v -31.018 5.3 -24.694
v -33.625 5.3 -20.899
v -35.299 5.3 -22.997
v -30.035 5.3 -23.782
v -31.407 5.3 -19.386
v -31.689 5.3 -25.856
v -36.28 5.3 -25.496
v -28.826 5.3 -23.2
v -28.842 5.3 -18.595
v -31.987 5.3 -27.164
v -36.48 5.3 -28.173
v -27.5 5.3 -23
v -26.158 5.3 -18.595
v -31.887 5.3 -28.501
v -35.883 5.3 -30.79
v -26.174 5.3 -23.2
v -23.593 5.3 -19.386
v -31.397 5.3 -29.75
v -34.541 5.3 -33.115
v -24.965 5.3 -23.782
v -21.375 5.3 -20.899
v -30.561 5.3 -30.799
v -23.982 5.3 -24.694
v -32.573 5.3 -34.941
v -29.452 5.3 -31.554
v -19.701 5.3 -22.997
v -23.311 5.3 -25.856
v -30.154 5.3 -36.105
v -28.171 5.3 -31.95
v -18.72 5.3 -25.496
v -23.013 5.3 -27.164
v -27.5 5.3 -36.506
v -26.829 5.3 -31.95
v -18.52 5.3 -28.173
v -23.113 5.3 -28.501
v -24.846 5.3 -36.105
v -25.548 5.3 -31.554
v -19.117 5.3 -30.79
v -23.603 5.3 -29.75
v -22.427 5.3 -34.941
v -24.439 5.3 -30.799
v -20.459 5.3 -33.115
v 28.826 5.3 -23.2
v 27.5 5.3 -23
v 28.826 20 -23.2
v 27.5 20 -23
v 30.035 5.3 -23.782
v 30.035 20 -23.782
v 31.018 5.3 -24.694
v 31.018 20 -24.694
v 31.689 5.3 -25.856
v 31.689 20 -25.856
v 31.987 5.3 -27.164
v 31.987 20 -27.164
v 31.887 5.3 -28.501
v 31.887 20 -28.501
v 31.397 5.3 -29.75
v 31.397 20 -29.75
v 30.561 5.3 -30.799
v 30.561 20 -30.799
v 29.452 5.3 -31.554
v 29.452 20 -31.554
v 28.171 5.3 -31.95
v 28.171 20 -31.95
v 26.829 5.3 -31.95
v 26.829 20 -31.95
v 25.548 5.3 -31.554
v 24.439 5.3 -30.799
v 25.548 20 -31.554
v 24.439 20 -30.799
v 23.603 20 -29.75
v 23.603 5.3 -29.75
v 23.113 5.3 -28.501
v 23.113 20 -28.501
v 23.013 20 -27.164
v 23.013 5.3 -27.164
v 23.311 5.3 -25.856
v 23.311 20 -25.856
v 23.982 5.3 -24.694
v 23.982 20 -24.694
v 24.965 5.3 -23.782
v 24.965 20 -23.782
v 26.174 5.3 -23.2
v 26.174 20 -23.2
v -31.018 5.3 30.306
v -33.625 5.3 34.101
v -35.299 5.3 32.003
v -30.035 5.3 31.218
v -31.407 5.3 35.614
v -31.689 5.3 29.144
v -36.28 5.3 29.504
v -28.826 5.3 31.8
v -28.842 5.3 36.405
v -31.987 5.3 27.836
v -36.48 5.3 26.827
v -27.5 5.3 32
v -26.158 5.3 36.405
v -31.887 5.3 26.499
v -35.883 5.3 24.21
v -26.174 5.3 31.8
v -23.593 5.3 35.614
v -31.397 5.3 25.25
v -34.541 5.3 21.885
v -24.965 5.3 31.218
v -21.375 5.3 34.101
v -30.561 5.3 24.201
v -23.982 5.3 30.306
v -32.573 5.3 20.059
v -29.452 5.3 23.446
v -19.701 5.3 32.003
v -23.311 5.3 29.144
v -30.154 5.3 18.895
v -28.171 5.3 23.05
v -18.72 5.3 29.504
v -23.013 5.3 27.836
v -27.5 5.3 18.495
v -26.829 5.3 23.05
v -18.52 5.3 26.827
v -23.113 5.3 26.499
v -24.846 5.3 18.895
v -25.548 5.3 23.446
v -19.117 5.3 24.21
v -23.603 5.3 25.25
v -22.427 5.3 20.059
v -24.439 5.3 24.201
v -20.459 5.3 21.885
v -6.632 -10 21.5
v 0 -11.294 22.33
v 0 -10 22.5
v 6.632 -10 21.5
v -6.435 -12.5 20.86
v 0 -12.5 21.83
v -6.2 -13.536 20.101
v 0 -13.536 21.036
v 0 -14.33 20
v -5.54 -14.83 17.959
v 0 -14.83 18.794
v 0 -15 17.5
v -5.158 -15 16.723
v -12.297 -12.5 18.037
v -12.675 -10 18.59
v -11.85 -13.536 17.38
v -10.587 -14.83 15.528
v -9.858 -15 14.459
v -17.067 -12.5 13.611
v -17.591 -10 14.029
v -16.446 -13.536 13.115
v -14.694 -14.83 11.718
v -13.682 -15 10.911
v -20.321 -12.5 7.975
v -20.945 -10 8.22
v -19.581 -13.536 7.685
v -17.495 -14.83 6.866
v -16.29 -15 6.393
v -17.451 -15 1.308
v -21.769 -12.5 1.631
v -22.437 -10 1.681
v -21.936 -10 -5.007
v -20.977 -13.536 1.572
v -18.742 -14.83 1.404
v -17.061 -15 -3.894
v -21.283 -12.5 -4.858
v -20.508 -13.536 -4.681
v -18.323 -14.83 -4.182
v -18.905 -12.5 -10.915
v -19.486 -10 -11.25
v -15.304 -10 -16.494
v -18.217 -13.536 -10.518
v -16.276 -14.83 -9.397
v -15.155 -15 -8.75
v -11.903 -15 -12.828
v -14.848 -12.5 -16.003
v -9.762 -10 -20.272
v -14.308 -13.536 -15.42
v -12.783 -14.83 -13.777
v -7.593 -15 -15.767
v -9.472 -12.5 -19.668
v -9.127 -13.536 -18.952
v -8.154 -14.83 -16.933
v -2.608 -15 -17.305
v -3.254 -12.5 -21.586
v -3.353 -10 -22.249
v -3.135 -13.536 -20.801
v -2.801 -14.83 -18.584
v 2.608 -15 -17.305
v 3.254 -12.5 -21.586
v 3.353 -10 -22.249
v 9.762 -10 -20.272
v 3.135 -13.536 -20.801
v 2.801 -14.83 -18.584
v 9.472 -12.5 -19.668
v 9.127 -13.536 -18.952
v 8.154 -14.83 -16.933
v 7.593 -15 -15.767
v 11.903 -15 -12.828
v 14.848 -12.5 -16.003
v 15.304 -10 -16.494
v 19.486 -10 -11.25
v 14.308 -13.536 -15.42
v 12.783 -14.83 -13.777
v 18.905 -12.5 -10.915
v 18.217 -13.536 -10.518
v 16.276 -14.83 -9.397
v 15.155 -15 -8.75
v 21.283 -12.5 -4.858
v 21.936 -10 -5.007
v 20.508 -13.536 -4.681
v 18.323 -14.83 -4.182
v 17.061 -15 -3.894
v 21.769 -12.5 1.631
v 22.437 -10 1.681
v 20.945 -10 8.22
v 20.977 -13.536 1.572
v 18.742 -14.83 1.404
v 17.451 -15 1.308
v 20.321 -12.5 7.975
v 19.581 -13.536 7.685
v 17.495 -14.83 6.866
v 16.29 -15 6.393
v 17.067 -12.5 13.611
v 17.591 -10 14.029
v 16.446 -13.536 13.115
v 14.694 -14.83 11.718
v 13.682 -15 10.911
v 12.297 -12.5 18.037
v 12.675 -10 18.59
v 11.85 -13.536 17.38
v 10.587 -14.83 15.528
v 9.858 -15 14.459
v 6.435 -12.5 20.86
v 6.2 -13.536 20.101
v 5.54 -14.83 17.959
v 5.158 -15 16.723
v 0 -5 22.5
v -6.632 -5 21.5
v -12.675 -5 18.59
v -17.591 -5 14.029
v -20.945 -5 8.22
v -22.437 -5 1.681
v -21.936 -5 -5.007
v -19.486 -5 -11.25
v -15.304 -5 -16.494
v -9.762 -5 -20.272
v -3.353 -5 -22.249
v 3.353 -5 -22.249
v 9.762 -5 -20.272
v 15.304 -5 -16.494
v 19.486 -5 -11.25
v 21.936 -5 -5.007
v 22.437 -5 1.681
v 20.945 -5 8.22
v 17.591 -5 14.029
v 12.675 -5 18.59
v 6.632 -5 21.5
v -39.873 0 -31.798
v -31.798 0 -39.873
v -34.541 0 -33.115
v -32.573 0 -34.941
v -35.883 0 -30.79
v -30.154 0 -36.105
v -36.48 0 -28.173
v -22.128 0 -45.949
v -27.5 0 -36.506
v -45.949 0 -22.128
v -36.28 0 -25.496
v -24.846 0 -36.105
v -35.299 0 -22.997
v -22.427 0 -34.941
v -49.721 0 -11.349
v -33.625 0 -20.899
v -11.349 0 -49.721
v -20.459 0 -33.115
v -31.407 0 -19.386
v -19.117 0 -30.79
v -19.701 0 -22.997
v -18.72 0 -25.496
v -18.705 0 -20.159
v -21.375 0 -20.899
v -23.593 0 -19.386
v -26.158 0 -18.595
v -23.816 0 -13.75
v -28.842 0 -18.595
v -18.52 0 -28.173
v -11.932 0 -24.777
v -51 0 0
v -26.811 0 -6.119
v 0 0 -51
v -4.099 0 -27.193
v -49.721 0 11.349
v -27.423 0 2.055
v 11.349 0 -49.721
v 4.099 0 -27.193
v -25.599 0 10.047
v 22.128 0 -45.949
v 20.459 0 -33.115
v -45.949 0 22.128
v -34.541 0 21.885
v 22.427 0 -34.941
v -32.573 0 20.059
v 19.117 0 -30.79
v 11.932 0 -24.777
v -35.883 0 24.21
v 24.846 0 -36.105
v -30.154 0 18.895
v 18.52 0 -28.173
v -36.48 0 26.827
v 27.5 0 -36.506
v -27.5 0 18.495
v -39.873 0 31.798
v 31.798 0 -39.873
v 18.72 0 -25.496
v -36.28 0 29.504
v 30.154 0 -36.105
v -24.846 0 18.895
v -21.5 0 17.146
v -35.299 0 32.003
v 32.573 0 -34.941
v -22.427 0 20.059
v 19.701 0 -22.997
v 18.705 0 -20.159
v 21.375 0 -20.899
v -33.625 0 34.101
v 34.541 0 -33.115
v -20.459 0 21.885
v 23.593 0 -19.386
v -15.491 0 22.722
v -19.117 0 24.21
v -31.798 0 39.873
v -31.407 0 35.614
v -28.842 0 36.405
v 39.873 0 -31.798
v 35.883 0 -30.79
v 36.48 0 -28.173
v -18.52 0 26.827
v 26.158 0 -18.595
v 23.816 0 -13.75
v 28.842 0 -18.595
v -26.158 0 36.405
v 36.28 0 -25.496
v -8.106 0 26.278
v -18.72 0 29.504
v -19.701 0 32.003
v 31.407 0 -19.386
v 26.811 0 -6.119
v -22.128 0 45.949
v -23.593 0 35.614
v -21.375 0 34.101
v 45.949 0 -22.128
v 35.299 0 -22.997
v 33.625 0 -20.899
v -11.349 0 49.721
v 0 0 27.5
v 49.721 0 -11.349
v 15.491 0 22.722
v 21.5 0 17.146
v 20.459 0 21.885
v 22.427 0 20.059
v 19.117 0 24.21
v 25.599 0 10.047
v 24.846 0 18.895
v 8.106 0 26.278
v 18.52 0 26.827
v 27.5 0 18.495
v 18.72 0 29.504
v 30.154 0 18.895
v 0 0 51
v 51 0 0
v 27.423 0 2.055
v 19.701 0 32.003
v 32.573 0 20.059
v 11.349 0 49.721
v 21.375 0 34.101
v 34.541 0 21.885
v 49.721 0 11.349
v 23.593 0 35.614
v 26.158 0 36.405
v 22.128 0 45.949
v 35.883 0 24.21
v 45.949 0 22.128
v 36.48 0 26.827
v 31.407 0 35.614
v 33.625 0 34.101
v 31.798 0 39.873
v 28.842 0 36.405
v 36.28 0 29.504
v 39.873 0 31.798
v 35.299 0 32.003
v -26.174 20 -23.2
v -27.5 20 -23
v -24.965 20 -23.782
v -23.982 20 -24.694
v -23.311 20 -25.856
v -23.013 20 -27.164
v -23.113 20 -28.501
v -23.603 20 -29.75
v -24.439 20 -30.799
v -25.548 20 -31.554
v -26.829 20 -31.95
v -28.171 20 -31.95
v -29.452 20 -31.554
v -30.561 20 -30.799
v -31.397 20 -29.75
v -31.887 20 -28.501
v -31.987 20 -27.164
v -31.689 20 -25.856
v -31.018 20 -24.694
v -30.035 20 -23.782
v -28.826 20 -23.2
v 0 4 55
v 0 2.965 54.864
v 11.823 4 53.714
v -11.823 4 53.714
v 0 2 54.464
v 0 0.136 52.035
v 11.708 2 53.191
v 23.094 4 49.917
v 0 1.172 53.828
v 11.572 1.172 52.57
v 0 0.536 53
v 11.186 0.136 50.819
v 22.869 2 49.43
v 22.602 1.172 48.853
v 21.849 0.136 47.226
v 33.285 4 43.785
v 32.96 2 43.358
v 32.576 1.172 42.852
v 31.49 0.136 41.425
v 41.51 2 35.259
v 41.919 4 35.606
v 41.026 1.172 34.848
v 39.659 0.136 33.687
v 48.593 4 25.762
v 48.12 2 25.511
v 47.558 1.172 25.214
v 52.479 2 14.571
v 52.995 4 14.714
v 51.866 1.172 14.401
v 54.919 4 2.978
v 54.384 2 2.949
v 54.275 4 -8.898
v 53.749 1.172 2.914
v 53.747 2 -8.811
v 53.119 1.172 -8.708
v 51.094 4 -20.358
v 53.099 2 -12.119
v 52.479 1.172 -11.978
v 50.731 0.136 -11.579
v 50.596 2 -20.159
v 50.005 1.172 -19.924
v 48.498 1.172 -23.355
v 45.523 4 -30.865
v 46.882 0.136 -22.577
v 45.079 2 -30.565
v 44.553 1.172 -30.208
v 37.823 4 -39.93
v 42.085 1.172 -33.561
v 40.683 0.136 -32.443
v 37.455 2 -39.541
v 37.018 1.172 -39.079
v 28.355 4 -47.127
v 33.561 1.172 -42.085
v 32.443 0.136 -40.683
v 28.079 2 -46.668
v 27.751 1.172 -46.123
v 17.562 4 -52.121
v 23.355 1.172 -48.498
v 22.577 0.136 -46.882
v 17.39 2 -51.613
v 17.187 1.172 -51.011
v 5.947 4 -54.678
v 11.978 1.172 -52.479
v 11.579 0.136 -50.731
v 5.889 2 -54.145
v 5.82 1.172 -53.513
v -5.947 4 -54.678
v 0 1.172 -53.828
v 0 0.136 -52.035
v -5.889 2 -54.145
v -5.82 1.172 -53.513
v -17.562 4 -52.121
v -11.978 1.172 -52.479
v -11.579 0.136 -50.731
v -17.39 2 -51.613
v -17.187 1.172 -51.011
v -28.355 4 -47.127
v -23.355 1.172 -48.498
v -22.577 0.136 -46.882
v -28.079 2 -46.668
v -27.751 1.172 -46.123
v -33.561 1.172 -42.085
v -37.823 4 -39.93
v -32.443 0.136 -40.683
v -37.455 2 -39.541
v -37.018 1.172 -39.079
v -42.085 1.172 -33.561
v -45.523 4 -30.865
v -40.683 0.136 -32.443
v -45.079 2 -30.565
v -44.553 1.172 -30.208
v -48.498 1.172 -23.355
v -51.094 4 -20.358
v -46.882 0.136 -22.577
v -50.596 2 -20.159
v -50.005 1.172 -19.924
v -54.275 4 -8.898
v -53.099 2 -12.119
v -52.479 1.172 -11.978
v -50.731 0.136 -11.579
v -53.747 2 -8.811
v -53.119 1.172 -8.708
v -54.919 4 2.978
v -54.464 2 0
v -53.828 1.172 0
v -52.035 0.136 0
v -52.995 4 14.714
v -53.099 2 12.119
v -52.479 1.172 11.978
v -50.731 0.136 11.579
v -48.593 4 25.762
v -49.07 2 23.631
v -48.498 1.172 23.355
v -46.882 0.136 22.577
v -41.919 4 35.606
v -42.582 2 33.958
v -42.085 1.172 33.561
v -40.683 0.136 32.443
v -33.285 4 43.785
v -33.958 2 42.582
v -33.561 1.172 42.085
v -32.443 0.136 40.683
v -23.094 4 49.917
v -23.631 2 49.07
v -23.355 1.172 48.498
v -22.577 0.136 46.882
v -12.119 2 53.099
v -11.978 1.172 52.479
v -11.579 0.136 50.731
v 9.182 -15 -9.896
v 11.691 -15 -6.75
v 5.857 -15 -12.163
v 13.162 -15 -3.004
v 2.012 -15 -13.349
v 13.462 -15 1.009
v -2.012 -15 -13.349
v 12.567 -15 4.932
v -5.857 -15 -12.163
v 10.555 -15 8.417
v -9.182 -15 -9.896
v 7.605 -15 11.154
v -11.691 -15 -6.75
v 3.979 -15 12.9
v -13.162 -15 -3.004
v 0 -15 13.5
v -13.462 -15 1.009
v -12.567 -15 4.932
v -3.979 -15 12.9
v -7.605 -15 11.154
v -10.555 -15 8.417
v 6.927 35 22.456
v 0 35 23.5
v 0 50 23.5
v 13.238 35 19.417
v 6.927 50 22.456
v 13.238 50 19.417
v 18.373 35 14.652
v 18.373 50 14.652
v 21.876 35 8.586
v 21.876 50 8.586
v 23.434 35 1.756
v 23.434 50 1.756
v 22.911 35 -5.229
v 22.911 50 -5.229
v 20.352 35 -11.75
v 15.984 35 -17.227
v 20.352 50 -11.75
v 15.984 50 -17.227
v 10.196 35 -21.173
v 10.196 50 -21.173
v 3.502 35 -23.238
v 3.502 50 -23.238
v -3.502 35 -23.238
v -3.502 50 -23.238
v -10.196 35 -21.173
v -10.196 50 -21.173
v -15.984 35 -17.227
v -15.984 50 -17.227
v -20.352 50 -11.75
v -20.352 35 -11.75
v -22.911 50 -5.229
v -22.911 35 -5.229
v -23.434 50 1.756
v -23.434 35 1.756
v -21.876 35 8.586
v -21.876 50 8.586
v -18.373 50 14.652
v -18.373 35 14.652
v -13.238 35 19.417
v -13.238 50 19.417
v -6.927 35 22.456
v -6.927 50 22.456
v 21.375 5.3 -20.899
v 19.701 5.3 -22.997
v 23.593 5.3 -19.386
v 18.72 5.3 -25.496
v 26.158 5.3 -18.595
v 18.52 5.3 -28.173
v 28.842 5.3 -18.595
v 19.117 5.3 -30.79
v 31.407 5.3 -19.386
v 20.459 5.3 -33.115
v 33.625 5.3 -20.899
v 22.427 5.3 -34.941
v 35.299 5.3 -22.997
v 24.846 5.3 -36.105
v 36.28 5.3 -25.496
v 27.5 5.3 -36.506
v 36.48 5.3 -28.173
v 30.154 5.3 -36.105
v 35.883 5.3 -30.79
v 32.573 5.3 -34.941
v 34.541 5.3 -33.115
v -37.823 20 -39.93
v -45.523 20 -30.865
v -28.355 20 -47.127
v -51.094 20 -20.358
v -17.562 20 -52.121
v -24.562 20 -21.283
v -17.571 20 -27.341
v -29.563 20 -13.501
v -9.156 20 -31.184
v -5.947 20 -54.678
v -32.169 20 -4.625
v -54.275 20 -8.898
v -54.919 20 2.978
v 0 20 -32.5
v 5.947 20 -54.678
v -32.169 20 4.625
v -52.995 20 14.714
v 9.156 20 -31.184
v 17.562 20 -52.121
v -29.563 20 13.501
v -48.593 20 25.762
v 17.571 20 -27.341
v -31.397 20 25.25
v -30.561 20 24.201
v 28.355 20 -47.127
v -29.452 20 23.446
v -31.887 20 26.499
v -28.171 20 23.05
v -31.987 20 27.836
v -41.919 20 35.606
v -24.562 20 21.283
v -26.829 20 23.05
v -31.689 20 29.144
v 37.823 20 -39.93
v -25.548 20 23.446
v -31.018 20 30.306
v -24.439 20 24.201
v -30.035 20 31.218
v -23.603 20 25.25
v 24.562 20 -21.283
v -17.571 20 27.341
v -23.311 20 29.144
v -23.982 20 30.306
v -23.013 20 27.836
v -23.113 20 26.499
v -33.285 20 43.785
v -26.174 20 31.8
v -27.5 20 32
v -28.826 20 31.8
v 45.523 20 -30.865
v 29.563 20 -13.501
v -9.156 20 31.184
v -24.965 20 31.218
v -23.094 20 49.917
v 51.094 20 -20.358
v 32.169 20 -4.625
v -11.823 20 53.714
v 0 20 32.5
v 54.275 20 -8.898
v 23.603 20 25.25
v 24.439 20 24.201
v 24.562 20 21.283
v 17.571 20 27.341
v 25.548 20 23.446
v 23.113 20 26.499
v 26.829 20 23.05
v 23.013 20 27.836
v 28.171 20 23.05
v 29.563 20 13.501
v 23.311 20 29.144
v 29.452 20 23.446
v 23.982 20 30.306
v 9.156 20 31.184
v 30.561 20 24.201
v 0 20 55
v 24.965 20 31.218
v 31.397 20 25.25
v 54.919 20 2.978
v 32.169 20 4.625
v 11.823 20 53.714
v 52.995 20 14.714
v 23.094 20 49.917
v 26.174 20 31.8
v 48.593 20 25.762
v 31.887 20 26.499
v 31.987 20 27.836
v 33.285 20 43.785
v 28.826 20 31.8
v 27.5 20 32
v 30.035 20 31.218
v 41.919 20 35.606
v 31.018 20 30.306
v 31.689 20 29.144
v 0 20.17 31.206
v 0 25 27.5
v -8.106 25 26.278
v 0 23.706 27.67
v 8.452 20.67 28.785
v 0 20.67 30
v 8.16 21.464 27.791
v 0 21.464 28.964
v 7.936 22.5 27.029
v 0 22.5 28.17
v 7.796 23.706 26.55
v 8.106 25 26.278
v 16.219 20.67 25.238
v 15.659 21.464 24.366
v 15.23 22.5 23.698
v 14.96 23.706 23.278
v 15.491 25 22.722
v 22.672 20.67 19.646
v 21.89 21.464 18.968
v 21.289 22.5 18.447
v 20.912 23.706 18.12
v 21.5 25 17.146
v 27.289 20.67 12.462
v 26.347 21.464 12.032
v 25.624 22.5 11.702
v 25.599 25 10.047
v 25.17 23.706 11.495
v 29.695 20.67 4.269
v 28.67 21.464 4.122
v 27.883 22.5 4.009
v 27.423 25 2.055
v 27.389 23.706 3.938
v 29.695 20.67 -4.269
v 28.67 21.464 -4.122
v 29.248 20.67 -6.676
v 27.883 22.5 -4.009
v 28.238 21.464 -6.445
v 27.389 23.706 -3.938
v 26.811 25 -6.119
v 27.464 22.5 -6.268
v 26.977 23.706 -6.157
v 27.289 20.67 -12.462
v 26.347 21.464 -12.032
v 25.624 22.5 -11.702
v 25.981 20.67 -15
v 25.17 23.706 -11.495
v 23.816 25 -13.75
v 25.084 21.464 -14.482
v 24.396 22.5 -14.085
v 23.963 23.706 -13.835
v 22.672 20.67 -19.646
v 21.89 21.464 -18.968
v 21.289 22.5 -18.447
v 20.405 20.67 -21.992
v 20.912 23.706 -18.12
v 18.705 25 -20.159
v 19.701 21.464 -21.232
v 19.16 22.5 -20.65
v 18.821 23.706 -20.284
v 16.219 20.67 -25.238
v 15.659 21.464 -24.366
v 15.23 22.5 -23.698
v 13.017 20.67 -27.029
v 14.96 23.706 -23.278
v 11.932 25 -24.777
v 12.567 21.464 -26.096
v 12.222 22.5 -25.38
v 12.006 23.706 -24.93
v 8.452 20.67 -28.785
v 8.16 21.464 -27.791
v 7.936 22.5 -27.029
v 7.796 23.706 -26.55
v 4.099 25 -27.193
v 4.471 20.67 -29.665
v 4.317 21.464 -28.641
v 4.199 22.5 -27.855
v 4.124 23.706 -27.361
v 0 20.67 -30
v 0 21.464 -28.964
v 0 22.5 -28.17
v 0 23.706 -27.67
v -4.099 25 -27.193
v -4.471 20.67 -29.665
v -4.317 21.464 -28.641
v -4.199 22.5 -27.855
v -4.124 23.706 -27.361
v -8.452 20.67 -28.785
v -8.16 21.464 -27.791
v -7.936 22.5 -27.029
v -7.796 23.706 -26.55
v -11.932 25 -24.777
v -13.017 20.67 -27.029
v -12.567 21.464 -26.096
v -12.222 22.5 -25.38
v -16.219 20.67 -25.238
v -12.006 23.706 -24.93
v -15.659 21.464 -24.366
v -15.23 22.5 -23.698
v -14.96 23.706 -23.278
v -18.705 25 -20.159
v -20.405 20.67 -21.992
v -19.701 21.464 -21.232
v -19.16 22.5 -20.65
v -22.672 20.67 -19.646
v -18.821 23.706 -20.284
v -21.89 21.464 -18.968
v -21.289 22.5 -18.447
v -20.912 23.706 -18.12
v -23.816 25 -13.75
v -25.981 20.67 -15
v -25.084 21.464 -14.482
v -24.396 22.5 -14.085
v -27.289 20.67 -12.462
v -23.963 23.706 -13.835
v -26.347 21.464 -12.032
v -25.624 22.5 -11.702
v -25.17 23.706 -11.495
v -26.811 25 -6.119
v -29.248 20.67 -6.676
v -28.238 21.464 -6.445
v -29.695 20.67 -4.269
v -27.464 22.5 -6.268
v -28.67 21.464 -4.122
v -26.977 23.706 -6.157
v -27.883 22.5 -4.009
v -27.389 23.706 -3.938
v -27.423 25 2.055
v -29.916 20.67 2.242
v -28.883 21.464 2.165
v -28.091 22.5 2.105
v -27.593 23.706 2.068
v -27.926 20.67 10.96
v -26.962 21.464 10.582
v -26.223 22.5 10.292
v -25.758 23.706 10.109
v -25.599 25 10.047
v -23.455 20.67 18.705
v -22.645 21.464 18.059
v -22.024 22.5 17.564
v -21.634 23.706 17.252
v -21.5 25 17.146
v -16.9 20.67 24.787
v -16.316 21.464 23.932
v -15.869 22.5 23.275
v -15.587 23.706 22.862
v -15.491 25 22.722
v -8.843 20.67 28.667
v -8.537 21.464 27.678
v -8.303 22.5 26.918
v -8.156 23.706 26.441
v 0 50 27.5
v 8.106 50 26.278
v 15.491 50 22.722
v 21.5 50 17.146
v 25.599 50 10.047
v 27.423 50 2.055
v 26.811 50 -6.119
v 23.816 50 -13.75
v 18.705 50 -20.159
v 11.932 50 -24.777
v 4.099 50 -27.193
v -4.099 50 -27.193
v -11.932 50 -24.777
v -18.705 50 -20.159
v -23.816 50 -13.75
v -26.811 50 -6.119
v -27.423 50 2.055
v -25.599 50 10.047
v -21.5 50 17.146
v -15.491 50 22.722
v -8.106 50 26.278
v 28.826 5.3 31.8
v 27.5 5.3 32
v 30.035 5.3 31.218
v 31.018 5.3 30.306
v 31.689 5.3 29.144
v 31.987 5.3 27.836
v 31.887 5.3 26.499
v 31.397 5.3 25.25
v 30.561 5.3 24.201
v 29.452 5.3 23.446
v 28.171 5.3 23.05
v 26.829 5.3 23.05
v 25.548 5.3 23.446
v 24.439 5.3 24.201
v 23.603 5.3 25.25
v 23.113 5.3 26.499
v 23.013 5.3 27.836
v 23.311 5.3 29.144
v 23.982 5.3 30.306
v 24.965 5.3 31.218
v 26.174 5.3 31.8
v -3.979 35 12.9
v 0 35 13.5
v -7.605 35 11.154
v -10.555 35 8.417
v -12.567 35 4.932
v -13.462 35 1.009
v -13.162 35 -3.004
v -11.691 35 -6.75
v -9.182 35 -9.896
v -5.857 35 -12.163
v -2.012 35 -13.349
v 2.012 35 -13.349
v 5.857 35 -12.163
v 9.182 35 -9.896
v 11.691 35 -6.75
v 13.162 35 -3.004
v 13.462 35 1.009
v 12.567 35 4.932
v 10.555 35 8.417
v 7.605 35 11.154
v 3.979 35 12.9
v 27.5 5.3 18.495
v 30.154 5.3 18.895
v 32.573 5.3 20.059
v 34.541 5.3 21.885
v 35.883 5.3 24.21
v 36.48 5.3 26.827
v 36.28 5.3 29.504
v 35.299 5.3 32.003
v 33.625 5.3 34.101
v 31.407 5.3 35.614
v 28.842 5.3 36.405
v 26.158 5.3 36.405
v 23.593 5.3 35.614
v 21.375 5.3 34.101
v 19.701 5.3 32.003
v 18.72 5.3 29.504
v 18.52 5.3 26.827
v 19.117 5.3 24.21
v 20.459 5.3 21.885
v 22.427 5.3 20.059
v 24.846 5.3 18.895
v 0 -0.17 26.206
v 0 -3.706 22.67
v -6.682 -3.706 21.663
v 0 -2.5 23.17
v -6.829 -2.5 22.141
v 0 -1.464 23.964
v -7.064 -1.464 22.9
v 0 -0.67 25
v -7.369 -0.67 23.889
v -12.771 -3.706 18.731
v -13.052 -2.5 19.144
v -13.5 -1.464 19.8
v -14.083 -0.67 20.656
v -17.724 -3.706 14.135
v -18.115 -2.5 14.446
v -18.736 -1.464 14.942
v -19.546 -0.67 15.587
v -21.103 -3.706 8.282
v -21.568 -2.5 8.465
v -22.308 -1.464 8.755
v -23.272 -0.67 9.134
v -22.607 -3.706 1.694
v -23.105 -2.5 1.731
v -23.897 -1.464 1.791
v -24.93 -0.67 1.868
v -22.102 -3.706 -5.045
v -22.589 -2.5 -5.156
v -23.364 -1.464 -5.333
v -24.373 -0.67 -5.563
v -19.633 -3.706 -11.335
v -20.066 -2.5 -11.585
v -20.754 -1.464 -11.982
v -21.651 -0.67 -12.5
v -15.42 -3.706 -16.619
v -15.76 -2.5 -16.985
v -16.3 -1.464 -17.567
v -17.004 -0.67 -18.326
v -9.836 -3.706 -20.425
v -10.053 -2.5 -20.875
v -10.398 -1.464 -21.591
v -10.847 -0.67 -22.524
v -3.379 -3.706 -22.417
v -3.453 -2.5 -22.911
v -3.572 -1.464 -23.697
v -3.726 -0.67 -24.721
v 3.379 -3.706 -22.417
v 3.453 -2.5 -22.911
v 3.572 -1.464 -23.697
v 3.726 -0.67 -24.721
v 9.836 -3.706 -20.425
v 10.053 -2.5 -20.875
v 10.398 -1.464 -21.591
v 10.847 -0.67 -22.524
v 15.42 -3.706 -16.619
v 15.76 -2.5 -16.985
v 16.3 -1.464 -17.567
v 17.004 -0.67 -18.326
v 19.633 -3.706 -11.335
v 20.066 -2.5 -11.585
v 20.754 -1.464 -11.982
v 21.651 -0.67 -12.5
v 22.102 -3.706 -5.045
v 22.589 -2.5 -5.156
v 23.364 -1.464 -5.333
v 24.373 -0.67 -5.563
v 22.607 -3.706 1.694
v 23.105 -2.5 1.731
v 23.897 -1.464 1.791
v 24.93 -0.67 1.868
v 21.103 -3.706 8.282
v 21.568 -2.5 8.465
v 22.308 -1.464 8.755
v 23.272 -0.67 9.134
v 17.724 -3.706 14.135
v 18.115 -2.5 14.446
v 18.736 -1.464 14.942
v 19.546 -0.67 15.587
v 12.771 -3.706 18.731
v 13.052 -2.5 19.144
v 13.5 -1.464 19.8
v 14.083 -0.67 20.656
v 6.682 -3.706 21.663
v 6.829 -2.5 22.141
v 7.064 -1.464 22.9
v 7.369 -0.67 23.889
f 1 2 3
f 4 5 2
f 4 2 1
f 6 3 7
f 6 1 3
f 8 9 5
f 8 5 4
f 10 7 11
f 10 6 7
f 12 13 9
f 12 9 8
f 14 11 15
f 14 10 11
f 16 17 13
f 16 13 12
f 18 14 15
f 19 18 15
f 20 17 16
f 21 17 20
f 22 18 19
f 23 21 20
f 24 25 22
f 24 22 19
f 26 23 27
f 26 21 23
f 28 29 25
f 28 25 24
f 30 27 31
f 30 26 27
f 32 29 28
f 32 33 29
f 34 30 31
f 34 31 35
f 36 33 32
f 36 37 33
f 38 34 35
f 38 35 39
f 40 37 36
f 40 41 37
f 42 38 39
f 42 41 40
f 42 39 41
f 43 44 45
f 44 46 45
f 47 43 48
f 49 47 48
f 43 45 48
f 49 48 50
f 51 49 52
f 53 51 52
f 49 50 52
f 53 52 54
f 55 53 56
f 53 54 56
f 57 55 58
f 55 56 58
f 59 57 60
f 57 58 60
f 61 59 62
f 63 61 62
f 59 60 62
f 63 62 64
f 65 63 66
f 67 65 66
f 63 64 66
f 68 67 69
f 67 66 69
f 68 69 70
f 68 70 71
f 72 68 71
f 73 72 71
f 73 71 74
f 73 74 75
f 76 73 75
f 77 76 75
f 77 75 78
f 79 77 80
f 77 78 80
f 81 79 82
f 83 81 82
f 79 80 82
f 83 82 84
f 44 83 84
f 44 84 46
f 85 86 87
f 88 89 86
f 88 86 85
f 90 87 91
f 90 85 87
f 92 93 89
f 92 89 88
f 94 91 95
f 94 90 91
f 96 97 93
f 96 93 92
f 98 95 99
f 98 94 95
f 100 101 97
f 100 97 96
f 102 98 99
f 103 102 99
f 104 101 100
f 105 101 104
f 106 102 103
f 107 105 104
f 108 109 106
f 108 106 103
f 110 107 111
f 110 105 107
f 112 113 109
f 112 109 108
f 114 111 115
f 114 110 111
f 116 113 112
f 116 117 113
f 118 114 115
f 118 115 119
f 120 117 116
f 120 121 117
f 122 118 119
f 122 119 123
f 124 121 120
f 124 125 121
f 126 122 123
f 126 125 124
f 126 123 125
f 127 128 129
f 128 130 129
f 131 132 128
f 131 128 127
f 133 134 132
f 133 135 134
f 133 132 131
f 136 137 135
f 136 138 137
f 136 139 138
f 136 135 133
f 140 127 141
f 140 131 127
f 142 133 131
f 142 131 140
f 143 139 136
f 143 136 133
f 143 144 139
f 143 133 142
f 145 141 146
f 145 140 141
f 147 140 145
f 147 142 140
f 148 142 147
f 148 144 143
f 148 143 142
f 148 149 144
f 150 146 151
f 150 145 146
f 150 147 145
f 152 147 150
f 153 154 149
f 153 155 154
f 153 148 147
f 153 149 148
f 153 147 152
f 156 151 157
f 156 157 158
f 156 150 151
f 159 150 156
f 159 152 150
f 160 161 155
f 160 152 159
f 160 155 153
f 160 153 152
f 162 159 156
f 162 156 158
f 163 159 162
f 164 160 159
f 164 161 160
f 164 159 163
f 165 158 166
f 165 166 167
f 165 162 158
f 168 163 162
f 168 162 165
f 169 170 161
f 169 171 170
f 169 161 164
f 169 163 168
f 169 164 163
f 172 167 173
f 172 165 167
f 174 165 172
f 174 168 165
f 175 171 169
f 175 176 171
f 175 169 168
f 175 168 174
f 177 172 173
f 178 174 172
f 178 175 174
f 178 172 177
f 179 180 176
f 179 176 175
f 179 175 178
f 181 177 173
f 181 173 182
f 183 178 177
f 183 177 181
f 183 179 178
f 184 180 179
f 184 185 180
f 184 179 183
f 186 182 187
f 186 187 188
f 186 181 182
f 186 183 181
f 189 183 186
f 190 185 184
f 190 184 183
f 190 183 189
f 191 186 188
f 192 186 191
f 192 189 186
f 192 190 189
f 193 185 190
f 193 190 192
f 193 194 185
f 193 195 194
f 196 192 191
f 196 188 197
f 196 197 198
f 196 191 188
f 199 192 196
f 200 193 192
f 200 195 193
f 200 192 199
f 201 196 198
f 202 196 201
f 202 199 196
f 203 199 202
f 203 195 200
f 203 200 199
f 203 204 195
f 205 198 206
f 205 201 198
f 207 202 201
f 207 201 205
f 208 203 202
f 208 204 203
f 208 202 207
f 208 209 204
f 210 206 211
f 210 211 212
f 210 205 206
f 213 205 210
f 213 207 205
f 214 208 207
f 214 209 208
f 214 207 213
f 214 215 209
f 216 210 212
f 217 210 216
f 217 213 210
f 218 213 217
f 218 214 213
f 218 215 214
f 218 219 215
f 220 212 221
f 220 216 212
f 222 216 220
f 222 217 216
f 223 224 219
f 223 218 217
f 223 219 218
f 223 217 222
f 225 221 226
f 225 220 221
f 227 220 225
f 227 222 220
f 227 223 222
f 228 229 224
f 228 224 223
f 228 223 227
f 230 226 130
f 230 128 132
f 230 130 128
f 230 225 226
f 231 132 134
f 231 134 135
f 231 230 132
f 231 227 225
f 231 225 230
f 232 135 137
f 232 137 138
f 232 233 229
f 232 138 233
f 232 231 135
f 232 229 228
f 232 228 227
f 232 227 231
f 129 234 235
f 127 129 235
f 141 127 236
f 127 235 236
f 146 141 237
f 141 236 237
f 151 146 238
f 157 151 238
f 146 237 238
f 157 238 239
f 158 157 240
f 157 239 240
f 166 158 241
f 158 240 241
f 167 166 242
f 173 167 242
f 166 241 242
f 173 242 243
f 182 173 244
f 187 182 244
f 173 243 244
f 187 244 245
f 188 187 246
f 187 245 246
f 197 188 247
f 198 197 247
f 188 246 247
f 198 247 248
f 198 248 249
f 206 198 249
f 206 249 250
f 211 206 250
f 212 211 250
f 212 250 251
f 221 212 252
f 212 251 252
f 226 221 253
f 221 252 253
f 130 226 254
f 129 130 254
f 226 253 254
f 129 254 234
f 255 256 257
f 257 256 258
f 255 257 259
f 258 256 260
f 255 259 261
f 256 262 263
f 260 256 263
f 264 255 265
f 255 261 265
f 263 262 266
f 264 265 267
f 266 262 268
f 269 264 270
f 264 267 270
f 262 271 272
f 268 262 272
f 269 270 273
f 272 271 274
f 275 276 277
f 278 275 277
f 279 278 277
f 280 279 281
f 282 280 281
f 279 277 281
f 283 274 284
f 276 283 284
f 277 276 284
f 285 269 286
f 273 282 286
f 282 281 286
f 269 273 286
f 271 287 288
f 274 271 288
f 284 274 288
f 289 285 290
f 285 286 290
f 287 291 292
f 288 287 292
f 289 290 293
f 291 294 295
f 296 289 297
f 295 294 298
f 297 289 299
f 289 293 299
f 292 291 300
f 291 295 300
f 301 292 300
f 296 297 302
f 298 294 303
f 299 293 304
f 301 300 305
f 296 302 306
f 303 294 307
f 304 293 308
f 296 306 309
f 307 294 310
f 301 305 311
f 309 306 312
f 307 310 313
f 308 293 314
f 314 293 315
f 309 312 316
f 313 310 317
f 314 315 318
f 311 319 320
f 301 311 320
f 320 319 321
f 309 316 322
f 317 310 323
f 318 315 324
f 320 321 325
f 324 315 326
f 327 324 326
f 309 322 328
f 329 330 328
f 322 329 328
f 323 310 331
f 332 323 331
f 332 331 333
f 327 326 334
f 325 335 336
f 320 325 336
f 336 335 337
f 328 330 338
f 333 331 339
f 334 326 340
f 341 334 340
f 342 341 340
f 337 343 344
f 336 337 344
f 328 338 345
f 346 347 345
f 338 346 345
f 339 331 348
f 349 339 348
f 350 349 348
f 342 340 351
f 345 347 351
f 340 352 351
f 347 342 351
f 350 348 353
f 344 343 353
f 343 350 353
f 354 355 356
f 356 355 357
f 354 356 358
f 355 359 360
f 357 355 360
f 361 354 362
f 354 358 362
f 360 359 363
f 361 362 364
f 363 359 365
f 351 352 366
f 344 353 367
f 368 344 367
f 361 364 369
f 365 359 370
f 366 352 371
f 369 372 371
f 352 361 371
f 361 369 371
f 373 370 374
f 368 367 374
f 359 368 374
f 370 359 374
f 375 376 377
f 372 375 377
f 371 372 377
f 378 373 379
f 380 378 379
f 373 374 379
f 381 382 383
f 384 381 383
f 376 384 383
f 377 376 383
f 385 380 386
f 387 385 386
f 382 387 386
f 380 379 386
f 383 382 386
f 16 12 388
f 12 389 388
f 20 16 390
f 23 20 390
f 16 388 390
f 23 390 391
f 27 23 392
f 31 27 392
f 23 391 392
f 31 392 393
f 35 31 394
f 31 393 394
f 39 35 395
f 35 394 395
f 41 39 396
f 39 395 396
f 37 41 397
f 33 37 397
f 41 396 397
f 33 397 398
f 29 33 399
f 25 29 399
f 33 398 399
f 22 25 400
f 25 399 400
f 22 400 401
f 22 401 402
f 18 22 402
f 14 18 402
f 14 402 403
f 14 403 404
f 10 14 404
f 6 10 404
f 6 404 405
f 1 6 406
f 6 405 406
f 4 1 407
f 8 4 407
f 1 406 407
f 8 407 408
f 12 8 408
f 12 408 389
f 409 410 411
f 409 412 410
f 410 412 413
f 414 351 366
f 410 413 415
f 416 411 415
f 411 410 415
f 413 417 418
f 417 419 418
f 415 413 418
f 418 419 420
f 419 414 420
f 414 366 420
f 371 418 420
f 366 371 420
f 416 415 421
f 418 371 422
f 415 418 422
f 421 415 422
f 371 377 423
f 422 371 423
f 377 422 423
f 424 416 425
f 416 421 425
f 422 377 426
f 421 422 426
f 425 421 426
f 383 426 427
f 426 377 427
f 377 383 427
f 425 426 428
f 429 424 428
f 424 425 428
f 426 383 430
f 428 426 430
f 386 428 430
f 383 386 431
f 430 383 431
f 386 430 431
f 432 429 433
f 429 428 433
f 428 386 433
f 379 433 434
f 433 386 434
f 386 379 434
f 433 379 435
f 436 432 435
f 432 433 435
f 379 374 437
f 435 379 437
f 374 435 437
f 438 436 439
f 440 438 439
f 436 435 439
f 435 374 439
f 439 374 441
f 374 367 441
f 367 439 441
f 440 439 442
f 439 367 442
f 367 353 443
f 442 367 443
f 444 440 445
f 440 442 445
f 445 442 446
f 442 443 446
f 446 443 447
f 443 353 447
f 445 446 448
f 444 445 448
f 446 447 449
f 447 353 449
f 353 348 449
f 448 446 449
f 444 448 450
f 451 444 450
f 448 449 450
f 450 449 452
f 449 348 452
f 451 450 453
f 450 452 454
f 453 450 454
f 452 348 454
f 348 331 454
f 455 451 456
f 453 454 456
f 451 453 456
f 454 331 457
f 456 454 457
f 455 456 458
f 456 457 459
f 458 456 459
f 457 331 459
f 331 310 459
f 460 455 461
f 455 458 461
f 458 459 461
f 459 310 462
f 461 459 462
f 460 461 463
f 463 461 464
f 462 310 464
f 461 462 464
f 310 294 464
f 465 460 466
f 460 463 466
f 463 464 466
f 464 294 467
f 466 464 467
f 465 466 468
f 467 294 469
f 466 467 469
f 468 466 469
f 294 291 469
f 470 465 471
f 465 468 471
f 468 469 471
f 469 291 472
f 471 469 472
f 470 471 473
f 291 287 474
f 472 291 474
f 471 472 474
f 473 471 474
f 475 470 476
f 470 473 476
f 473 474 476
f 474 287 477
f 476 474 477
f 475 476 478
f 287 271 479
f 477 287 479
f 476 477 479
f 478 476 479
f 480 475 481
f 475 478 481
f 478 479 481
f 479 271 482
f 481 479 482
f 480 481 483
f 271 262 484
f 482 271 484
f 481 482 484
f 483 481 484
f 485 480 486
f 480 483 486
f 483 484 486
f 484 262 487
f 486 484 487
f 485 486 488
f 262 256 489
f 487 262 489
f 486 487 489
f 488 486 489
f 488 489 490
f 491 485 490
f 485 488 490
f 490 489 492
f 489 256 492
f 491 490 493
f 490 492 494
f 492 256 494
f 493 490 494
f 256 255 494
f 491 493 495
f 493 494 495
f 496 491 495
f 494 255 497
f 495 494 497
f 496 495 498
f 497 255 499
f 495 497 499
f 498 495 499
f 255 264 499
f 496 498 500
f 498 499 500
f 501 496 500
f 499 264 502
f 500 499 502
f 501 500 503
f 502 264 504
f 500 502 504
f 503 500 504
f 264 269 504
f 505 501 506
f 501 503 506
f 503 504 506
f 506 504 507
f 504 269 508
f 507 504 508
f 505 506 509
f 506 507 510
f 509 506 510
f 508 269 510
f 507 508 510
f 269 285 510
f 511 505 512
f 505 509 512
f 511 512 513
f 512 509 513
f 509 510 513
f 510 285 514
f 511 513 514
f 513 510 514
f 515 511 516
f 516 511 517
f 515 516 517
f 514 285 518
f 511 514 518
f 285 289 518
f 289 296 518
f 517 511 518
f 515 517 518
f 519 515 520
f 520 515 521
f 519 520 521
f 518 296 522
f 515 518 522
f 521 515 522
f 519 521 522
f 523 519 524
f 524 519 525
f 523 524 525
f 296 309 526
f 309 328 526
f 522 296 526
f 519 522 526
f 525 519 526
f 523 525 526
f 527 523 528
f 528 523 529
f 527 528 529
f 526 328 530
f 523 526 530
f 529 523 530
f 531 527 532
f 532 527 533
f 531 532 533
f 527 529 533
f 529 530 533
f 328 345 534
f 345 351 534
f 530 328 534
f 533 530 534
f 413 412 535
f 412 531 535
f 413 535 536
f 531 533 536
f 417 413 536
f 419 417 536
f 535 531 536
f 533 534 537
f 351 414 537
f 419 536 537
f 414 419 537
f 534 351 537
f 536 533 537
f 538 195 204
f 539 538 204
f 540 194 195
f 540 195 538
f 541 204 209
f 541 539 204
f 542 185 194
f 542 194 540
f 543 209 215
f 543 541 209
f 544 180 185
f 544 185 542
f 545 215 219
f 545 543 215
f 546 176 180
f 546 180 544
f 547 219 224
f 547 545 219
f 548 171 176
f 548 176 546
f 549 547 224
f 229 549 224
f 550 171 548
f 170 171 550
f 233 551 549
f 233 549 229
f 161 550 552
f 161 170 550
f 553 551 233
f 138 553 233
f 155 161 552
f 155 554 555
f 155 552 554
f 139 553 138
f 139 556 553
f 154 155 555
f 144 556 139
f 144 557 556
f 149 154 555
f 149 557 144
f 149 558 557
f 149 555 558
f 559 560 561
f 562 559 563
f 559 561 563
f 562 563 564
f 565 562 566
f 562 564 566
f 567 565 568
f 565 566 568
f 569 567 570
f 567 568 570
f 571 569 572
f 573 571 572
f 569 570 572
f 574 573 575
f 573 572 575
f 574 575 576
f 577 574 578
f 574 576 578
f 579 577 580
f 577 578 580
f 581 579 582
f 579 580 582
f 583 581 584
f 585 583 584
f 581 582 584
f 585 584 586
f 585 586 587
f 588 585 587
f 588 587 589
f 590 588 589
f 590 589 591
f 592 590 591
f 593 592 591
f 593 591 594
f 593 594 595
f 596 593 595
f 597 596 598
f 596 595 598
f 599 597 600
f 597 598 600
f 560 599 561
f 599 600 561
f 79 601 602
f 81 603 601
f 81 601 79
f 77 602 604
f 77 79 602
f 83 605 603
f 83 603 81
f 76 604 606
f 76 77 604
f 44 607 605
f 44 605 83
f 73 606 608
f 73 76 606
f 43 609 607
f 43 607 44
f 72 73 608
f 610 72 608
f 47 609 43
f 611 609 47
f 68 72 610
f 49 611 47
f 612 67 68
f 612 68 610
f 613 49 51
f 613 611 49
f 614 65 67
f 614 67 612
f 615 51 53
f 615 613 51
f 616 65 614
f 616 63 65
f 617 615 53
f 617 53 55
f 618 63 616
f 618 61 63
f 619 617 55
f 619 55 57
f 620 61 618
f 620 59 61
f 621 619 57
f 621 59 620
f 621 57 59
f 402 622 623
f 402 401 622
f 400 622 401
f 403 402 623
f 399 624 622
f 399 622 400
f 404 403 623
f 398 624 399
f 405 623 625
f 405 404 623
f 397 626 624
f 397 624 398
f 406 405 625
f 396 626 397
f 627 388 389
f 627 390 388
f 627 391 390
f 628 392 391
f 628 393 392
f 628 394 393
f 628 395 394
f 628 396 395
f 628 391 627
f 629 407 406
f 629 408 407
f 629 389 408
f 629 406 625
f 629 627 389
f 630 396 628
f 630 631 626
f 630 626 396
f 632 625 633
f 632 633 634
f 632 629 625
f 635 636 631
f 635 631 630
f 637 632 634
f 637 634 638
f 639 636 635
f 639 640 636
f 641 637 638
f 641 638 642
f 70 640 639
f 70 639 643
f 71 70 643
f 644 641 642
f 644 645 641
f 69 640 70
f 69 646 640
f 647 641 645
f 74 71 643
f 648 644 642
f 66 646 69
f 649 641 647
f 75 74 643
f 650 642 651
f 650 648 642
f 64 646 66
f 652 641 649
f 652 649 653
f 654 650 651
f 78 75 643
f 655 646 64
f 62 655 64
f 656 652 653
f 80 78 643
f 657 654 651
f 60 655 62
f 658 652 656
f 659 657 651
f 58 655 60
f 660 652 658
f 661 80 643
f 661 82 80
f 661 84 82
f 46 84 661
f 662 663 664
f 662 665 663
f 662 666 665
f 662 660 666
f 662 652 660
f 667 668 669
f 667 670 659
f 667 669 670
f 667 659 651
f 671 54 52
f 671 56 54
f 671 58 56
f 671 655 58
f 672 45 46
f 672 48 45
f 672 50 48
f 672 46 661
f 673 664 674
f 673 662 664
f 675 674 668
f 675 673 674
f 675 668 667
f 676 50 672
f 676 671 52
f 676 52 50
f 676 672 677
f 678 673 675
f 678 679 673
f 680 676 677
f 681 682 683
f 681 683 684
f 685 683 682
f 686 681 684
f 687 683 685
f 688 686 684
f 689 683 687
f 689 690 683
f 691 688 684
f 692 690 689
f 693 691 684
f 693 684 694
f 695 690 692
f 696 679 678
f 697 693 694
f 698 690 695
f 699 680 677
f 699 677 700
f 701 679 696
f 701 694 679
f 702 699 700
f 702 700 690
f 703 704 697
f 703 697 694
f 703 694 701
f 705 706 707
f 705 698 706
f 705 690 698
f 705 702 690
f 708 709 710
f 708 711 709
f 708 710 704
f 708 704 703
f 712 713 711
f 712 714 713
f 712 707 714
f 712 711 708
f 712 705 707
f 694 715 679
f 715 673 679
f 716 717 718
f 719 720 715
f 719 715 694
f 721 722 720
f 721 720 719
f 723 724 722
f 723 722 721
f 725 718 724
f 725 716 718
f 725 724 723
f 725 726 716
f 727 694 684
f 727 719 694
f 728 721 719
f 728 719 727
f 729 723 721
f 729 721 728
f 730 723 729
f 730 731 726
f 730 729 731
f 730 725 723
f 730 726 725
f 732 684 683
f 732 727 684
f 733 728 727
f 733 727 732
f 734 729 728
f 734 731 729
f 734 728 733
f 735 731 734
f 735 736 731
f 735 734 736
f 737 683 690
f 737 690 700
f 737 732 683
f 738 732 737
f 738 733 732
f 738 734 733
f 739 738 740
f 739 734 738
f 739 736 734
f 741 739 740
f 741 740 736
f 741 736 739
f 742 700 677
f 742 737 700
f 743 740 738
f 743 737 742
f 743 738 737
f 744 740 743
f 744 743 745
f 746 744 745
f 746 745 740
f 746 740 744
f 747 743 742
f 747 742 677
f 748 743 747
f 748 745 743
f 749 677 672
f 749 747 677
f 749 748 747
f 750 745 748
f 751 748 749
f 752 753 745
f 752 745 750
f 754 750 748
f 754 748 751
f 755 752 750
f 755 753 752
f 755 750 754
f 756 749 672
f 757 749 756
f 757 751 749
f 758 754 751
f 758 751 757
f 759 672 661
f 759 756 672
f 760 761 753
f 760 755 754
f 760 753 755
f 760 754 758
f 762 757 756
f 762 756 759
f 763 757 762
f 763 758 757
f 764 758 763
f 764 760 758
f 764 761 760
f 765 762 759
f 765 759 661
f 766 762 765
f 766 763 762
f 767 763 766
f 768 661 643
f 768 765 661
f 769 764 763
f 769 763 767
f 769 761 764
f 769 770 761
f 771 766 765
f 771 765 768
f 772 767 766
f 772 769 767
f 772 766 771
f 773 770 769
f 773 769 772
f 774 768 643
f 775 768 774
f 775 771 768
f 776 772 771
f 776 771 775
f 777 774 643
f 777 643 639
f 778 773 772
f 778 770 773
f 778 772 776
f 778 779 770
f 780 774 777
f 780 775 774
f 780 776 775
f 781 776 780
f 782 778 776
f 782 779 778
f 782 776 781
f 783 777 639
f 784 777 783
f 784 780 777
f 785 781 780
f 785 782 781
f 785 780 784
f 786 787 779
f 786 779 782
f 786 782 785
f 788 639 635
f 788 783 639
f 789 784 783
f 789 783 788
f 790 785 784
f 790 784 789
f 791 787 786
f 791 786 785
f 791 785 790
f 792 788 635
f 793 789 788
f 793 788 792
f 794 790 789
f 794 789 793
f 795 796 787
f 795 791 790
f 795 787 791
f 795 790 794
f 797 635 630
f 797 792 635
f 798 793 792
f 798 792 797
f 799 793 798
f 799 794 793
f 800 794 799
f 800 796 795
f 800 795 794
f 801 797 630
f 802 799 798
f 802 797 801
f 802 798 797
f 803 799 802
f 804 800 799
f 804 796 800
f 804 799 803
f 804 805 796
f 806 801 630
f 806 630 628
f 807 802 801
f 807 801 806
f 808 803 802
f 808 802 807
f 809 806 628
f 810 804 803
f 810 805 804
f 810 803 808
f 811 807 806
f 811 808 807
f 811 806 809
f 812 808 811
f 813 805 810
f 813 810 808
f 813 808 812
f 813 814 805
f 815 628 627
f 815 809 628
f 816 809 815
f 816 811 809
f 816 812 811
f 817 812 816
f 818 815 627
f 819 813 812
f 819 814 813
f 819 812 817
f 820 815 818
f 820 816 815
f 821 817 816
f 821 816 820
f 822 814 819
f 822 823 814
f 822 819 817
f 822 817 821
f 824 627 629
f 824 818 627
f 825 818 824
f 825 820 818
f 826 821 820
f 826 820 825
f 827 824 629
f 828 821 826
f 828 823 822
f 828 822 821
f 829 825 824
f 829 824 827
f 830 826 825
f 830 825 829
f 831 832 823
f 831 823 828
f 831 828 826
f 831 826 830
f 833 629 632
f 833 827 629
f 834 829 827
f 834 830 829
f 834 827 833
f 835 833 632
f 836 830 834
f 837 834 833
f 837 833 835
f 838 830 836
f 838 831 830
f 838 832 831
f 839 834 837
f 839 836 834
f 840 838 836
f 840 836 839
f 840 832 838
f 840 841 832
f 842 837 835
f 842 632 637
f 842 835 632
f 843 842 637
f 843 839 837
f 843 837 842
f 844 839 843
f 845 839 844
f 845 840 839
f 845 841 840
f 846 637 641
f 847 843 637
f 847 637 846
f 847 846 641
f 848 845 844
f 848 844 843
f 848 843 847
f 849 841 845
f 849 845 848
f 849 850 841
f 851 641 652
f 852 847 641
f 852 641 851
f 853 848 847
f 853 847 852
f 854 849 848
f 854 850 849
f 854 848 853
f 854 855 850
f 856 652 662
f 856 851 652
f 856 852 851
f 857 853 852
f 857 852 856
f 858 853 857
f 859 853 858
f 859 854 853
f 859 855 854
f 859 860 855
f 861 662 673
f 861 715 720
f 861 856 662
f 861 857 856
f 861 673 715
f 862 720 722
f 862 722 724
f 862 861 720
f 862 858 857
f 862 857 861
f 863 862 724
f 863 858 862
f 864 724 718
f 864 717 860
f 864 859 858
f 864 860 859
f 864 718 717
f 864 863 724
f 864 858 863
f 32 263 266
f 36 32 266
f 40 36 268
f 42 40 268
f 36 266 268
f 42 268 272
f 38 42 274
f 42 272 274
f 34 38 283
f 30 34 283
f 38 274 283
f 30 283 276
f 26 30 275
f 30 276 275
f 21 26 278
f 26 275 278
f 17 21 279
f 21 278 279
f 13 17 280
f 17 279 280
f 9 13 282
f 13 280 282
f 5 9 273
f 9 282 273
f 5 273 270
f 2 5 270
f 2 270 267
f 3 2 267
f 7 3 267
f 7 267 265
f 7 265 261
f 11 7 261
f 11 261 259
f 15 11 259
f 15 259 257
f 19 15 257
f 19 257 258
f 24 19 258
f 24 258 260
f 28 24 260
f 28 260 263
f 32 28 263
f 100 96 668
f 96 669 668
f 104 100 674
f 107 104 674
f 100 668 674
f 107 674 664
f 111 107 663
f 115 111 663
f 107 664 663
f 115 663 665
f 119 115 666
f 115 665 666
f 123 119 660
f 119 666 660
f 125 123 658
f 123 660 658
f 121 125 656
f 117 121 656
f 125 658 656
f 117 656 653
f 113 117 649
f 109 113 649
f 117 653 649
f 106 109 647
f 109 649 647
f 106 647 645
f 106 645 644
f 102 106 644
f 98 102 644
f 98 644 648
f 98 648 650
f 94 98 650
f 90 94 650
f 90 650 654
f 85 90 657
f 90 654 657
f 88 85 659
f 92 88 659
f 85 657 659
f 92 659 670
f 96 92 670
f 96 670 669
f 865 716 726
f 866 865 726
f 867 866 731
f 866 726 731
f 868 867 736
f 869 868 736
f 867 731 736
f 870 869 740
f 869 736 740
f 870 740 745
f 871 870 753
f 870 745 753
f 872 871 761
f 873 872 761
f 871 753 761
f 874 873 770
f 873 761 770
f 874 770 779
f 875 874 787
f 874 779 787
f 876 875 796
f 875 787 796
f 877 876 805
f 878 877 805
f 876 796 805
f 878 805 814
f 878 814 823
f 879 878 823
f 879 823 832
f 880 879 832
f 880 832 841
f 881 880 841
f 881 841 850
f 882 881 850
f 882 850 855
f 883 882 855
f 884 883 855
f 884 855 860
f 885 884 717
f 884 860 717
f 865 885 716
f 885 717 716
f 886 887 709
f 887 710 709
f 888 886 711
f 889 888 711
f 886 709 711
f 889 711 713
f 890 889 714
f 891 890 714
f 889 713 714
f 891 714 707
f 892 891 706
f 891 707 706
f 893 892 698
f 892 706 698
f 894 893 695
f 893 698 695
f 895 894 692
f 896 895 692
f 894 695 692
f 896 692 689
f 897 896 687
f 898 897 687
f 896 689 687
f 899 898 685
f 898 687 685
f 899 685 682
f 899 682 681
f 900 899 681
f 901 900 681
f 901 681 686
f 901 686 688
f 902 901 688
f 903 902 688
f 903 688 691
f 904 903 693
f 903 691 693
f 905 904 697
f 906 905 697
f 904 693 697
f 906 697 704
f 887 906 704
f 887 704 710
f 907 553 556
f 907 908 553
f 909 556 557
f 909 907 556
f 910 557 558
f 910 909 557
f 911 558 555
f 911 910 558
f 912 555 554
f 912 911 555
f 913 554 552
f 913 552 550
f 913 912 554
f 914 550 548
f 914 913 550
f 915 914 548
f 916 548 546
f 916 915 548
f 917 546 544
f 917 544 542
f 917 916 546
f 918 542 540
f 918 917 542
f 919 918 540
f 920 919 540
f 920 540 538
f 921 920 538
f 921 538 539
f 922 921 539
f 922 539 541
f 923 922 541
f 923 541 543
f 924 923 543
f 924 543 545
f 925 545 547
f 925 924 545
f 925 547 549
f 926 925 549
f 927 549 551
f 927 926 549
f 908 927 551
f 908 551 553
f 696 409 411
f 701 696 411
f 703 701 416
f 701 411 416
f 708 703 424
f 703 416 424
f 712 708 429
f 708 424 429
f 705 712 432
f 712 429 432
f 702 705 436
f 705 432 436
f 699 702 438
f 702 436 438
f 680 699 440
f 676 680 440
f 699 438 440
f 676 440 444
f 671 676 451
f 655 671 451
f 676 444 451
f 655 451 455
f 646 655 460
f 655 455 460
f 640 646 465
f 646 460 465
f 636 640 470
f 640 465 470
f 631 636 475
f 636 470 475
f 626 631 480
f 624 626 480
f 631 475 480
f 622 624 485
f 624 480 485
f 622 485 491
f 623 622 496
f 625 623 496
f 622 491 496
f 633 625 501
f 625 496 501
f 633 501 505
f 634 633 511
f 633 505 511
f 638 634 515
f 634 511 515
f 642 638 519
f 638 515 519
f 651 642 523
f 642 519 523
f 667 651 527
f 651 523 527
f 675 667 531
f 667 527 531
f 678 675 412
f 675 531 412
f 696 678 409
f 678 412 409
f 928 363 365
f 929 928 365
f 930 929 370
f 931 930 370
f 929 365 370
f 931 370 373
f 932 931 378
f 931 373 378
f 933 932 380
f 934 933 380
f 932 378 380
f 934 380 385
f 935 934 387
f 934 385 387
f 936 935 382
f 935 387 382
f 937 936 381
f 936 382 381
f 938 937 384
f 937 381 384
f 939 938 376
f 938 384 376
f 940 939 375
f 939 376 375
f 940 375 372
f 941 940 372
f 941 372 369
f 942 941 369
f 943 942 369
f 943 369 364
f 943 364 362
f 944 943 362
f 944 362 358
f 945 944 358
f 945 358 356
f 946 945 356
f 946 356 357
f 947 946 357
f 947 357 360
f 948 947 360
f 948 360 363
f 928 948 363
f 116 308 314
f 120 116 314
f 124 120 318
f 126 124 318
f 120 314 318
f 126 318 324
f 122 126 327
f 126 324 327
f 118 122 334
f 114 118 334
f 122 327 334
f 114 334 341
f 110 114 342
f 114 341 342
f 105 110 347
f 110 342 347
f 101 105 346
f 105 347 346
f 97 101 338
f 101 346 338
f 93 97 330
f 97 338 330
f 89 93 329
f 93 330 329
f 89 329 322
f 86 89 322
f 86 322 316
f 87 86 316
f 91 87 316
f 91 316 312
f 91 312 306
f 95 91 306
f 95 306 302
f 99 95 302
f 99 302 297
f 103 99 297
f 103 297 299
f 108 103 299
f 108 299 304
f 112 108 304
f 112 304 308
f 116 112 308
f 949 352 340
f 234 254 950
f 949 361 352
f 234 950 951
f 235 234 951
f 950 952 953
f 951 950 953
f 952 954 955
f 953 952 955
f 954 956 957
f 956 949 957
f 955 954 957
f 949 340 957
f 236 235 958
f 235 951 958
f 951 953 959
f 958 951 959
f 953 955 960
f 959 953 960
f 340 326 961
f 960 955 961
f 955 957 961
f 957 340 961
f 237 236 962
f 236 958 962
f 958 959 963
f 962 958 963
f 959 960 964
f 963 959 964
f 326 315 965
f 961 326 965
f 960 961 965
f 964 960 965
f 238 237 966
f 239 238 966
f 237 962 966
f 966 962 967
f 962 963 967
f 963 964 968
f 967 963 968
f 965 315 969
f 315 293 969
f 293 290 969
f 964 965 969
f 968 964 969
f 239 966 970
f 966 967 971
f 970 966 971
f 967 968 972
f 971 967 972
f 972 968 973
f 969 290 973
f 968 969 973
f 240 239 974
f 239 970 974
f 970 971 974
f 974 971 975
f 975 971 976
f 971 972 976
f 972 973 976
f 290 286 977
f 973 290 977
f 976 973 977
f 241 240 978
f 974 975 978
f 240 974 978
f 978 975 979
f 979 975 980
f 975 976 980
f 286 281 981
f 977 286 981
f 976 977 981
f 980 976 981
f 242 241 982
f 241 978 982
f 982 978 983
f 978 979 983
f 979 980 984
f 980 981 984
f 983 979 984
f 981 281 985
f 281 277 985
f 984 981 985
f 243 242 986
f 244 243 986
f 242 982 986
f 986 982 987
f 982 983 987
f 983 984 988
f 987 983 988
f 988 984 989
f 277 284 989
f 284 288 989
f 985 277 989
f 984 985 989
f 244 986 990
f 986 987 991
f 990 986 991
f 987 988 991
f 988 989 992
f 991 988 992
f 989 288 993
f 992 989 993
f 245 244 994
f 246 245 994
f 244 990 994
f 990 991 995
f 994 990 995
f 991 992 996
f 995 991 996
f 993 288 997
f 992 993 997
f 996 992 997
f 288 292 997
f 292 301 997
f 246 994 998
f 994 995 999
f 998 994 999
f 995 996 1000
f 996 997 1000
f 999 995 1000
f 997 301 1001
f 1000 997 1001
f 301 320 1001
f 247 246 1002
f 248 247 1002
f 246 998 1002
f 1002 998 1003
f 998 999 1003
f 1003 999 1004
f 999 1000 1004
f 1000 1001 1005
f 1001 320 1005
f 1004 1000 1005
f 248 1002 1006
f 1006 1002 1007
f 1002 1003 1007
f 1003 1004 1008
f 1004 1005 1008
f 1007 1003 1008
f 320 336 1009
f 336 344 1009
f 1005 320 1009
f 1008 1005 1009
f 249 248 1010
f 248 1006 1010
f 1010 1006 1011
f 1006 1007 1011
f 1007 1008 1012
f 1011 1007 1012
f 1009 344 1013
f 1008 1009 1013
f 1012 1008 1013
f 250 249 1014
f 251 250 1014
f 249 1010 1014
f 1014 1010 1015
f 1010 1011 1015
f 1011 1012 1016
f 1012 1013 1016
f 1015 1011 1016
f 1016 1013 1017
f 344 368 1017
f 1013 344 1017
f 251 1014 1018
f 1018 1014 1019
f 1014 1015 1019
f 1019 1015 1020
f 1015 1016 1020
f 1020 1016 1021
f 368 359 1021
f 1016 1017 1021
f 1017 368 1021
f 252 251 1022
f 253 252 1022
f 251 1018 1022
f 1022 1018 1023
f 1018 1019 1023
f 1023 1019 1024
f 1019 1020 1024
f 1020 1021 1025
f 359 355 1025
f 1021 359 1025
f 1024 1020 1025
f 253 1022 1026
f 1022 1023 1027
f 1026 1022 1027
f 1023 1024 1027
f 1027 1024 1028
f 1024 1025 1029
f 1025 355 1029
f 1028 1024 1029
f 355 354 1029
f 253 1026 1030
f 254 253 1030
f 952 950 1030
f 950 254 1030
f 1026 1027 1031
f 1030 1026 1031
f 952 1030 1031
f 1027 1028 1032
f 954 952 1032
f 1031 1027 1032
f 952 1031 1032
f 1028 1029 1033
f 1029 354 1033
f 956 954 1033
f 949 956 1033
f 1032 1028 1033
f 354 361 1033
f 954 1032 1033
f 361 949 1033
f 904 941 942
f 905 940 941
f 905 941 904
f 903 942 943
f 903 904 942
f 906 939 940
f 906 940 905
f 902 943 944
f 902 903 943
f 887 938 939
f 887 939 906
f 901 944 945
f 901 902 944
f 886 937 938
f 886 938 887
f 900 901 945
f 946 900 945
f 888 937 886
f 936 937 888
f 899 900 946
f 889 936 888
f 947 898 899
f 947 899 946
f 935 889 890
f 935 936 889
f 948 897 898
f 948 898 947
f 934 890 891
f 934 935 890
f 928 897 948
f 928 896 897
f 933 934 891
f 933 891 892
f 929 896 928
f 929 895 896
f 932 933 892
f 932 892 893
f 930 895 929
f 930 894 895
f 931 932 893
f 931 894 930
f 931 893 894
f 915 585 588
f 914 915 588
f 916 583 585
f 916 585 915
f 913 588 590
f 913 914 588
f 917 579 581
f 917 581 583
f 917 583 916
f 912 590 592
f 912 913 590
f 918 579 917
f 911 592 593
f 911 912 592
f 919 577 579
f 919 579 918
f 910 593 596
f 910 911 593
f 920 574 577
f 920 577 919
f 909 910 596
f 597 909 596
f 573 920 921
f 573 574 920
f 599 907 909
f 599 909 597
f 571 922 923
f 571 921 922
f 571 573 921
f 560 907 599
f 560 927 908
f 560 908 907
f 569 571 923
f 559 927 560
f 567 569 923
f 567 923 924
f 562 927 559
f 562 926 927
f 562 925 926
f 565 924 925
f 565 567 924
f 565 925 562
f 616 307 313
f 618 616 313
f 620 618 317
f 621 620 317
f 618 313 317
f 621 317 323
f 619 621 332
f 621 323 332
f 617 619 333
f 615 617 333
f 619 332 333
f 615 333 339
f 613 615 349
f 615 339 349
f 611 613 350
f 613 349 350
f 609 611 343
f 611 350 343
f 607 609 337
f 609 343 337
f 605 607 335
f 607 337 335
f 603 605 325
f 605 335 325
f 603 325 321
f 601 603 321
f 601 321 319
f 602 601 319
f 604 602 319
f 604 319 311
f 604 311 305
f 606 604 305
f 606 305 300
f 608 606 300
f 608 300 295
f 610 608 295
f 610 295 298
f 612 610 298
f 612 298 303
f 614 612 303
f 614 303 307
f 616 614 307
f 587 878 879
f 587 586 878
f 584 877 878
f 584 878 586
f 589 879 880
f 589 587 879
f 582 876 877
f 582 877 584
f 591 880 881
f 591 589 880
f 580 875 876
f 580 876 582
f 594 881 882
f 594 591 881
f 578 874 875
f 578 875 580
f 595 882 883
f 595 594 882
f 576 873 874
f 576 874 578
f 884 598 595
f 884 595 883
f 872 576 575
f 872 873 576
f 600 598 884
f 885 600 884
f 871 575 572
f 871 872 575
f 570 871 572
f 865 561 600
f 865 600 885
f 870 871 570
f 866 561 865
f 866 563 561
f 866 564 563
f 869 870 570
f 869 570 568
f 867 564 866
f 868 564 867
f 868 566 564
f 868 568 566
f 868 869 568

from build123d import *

# Parameters (mm, degrees)
SKETCH1_R                               = 55
BOSS_EXTRUDE1_DEPTH                     = 20
SKETCH2_R                               = 27.5
BOSS_EXTRUDE2_DEPTH                     = 30
SKETCH6_R                               = 23.5
CUT_EXTRUDE1_DEPTH                      = 15
FILLET1_R                               = 5
CBORE_FOR_M8_HEX_HEAD_BOLT1_D           = 9
CBORE_FOR_M8_HEX_HEAD_BOLT1_CBORE_D     = 18.011
CBORE_FOR_M8_HEX_HEAD_BOLT1_CBORE_DEPTH = 5.3
FILLET2_R                               = 4
SKETCH10_R                              = 13.5
CUT_EXTRUDE2_DEPTH                      = 53
SKETCH11_R                              = 22.5
SKETCH11_R_2                            = 13.5
BOSS_EXTRUDE3_DEPTH                     = 15
FILLET3_R                               = 5


with BuildPart() as part:
    # Sketch1 → Boss-Extrude1 (new body)
    with BuildSketch(Plane(origin=(0, 0, 0), x_dir=(1, 0, 0), z_dir=(0, 1, 0))):
        with Locations(Location((0, 0, 0), (0, 0, 270))):
            Circle(SKETCH1_R)
    extrude(amount=BOSS_EXTRUDE1_DEPTH)

    # Sketch2 → Boss-Extrude2 (add)
    with BuildSketch(Plane(origin=(0, 20, 0), x_dir=(1, 0, 0), z_dir=(0, 1, 0))):
        with Locations(Location((0, 0, 0), (0, 0, 270))):
            Circle(SKETCH2_R)
    extrude(amount=BOSS_EXTRUDE2_DEPTH)

    # Sketch6 → Cut-Extrude1 (cut)
    with BuildSketch(Plane(origin=(0, 50, 0), x_dir=(1, 0, 0), z_dir=(0, 1, 0))):
        with Locations(Location((0, 0, 0), (0, 0, 270))):
            Circle(SKETCH6_R)
    extrude(amount=-CUT_EXTRUDE1_DEPTH, mode=Mode.SUBTRACT)

    # Fillet1
    fillet1_edges = [part.edges().sort_by_distance(p)[0] for p in [
        (0, 20, -27.5),
    ]]
    fillet(fillet1_edges, radius=FILLET1_R)

    # CBORE for M8 Hex Head Bolt1 (through all)
    with Locations(Plane(origin=(-27.5, 0, 27.5), x_dir=(0, 0, -1), z_dir=(0, -1, 0))):
        with Locations((0, 0), (0, 55), (55, 55), (55, 0)):
            CounterBoreHole(CBORE_FOR_M8_HEX_HEAD_BOLT1_D / 2, CBORE_FOR_M8_HEX_HEAD_BOLT1_CBORE_D / 2, CBORE_FOR_M8_HEX_HEAD_BOLT1_CBORE_DEPTH)

    # Fillet2
    fillet2_edges = [part.edges().sort_by_distance(p)[0] for p in [
        (0, 0, -55),
    ]]
    fillet(fillet2_edges, radius=FILLET2_R)

    # Sketch10 → Cut-Extrude2 (cut)
    with BuildSketch(Plane(origin=(0, 35, 0), x_dir=(1, 0, 0), z_dir=(0, 1, 0))):
        with Locations(Location((0, 0, 0), (0, 0, 270))):
            Circle(SKETCH10_R)
    extrude(amount=-CUT_EXTRUDE2_DEPTH, mode=Mode.SUBTRACT)

    # Sketch11 → Boss-Extrude3 (add)
    with BuildSketch(Plane.XZ):
        with Locations(Location((0, 0, 0), (0, 0, 90))):
            Circle(SKETCH11_R)
        with Locations(Location((0, 0, 0), (0, 0, 90))):
            Circle(SKETCH11_R_2, mode=Mode.SUBTRACT)
    extrude(amount=BOSS_EXTRUDE3_DEPTH)

    # Fillet3
    fillet3_edges = [part.edges().sort_by_distance(p)[0] for p in [
        (0, 0, -22.5),
        (0, -15, -22.5),
    ]]
    fillet(fillet3_edges, radius=FILLET3_R)


solid = part.part
